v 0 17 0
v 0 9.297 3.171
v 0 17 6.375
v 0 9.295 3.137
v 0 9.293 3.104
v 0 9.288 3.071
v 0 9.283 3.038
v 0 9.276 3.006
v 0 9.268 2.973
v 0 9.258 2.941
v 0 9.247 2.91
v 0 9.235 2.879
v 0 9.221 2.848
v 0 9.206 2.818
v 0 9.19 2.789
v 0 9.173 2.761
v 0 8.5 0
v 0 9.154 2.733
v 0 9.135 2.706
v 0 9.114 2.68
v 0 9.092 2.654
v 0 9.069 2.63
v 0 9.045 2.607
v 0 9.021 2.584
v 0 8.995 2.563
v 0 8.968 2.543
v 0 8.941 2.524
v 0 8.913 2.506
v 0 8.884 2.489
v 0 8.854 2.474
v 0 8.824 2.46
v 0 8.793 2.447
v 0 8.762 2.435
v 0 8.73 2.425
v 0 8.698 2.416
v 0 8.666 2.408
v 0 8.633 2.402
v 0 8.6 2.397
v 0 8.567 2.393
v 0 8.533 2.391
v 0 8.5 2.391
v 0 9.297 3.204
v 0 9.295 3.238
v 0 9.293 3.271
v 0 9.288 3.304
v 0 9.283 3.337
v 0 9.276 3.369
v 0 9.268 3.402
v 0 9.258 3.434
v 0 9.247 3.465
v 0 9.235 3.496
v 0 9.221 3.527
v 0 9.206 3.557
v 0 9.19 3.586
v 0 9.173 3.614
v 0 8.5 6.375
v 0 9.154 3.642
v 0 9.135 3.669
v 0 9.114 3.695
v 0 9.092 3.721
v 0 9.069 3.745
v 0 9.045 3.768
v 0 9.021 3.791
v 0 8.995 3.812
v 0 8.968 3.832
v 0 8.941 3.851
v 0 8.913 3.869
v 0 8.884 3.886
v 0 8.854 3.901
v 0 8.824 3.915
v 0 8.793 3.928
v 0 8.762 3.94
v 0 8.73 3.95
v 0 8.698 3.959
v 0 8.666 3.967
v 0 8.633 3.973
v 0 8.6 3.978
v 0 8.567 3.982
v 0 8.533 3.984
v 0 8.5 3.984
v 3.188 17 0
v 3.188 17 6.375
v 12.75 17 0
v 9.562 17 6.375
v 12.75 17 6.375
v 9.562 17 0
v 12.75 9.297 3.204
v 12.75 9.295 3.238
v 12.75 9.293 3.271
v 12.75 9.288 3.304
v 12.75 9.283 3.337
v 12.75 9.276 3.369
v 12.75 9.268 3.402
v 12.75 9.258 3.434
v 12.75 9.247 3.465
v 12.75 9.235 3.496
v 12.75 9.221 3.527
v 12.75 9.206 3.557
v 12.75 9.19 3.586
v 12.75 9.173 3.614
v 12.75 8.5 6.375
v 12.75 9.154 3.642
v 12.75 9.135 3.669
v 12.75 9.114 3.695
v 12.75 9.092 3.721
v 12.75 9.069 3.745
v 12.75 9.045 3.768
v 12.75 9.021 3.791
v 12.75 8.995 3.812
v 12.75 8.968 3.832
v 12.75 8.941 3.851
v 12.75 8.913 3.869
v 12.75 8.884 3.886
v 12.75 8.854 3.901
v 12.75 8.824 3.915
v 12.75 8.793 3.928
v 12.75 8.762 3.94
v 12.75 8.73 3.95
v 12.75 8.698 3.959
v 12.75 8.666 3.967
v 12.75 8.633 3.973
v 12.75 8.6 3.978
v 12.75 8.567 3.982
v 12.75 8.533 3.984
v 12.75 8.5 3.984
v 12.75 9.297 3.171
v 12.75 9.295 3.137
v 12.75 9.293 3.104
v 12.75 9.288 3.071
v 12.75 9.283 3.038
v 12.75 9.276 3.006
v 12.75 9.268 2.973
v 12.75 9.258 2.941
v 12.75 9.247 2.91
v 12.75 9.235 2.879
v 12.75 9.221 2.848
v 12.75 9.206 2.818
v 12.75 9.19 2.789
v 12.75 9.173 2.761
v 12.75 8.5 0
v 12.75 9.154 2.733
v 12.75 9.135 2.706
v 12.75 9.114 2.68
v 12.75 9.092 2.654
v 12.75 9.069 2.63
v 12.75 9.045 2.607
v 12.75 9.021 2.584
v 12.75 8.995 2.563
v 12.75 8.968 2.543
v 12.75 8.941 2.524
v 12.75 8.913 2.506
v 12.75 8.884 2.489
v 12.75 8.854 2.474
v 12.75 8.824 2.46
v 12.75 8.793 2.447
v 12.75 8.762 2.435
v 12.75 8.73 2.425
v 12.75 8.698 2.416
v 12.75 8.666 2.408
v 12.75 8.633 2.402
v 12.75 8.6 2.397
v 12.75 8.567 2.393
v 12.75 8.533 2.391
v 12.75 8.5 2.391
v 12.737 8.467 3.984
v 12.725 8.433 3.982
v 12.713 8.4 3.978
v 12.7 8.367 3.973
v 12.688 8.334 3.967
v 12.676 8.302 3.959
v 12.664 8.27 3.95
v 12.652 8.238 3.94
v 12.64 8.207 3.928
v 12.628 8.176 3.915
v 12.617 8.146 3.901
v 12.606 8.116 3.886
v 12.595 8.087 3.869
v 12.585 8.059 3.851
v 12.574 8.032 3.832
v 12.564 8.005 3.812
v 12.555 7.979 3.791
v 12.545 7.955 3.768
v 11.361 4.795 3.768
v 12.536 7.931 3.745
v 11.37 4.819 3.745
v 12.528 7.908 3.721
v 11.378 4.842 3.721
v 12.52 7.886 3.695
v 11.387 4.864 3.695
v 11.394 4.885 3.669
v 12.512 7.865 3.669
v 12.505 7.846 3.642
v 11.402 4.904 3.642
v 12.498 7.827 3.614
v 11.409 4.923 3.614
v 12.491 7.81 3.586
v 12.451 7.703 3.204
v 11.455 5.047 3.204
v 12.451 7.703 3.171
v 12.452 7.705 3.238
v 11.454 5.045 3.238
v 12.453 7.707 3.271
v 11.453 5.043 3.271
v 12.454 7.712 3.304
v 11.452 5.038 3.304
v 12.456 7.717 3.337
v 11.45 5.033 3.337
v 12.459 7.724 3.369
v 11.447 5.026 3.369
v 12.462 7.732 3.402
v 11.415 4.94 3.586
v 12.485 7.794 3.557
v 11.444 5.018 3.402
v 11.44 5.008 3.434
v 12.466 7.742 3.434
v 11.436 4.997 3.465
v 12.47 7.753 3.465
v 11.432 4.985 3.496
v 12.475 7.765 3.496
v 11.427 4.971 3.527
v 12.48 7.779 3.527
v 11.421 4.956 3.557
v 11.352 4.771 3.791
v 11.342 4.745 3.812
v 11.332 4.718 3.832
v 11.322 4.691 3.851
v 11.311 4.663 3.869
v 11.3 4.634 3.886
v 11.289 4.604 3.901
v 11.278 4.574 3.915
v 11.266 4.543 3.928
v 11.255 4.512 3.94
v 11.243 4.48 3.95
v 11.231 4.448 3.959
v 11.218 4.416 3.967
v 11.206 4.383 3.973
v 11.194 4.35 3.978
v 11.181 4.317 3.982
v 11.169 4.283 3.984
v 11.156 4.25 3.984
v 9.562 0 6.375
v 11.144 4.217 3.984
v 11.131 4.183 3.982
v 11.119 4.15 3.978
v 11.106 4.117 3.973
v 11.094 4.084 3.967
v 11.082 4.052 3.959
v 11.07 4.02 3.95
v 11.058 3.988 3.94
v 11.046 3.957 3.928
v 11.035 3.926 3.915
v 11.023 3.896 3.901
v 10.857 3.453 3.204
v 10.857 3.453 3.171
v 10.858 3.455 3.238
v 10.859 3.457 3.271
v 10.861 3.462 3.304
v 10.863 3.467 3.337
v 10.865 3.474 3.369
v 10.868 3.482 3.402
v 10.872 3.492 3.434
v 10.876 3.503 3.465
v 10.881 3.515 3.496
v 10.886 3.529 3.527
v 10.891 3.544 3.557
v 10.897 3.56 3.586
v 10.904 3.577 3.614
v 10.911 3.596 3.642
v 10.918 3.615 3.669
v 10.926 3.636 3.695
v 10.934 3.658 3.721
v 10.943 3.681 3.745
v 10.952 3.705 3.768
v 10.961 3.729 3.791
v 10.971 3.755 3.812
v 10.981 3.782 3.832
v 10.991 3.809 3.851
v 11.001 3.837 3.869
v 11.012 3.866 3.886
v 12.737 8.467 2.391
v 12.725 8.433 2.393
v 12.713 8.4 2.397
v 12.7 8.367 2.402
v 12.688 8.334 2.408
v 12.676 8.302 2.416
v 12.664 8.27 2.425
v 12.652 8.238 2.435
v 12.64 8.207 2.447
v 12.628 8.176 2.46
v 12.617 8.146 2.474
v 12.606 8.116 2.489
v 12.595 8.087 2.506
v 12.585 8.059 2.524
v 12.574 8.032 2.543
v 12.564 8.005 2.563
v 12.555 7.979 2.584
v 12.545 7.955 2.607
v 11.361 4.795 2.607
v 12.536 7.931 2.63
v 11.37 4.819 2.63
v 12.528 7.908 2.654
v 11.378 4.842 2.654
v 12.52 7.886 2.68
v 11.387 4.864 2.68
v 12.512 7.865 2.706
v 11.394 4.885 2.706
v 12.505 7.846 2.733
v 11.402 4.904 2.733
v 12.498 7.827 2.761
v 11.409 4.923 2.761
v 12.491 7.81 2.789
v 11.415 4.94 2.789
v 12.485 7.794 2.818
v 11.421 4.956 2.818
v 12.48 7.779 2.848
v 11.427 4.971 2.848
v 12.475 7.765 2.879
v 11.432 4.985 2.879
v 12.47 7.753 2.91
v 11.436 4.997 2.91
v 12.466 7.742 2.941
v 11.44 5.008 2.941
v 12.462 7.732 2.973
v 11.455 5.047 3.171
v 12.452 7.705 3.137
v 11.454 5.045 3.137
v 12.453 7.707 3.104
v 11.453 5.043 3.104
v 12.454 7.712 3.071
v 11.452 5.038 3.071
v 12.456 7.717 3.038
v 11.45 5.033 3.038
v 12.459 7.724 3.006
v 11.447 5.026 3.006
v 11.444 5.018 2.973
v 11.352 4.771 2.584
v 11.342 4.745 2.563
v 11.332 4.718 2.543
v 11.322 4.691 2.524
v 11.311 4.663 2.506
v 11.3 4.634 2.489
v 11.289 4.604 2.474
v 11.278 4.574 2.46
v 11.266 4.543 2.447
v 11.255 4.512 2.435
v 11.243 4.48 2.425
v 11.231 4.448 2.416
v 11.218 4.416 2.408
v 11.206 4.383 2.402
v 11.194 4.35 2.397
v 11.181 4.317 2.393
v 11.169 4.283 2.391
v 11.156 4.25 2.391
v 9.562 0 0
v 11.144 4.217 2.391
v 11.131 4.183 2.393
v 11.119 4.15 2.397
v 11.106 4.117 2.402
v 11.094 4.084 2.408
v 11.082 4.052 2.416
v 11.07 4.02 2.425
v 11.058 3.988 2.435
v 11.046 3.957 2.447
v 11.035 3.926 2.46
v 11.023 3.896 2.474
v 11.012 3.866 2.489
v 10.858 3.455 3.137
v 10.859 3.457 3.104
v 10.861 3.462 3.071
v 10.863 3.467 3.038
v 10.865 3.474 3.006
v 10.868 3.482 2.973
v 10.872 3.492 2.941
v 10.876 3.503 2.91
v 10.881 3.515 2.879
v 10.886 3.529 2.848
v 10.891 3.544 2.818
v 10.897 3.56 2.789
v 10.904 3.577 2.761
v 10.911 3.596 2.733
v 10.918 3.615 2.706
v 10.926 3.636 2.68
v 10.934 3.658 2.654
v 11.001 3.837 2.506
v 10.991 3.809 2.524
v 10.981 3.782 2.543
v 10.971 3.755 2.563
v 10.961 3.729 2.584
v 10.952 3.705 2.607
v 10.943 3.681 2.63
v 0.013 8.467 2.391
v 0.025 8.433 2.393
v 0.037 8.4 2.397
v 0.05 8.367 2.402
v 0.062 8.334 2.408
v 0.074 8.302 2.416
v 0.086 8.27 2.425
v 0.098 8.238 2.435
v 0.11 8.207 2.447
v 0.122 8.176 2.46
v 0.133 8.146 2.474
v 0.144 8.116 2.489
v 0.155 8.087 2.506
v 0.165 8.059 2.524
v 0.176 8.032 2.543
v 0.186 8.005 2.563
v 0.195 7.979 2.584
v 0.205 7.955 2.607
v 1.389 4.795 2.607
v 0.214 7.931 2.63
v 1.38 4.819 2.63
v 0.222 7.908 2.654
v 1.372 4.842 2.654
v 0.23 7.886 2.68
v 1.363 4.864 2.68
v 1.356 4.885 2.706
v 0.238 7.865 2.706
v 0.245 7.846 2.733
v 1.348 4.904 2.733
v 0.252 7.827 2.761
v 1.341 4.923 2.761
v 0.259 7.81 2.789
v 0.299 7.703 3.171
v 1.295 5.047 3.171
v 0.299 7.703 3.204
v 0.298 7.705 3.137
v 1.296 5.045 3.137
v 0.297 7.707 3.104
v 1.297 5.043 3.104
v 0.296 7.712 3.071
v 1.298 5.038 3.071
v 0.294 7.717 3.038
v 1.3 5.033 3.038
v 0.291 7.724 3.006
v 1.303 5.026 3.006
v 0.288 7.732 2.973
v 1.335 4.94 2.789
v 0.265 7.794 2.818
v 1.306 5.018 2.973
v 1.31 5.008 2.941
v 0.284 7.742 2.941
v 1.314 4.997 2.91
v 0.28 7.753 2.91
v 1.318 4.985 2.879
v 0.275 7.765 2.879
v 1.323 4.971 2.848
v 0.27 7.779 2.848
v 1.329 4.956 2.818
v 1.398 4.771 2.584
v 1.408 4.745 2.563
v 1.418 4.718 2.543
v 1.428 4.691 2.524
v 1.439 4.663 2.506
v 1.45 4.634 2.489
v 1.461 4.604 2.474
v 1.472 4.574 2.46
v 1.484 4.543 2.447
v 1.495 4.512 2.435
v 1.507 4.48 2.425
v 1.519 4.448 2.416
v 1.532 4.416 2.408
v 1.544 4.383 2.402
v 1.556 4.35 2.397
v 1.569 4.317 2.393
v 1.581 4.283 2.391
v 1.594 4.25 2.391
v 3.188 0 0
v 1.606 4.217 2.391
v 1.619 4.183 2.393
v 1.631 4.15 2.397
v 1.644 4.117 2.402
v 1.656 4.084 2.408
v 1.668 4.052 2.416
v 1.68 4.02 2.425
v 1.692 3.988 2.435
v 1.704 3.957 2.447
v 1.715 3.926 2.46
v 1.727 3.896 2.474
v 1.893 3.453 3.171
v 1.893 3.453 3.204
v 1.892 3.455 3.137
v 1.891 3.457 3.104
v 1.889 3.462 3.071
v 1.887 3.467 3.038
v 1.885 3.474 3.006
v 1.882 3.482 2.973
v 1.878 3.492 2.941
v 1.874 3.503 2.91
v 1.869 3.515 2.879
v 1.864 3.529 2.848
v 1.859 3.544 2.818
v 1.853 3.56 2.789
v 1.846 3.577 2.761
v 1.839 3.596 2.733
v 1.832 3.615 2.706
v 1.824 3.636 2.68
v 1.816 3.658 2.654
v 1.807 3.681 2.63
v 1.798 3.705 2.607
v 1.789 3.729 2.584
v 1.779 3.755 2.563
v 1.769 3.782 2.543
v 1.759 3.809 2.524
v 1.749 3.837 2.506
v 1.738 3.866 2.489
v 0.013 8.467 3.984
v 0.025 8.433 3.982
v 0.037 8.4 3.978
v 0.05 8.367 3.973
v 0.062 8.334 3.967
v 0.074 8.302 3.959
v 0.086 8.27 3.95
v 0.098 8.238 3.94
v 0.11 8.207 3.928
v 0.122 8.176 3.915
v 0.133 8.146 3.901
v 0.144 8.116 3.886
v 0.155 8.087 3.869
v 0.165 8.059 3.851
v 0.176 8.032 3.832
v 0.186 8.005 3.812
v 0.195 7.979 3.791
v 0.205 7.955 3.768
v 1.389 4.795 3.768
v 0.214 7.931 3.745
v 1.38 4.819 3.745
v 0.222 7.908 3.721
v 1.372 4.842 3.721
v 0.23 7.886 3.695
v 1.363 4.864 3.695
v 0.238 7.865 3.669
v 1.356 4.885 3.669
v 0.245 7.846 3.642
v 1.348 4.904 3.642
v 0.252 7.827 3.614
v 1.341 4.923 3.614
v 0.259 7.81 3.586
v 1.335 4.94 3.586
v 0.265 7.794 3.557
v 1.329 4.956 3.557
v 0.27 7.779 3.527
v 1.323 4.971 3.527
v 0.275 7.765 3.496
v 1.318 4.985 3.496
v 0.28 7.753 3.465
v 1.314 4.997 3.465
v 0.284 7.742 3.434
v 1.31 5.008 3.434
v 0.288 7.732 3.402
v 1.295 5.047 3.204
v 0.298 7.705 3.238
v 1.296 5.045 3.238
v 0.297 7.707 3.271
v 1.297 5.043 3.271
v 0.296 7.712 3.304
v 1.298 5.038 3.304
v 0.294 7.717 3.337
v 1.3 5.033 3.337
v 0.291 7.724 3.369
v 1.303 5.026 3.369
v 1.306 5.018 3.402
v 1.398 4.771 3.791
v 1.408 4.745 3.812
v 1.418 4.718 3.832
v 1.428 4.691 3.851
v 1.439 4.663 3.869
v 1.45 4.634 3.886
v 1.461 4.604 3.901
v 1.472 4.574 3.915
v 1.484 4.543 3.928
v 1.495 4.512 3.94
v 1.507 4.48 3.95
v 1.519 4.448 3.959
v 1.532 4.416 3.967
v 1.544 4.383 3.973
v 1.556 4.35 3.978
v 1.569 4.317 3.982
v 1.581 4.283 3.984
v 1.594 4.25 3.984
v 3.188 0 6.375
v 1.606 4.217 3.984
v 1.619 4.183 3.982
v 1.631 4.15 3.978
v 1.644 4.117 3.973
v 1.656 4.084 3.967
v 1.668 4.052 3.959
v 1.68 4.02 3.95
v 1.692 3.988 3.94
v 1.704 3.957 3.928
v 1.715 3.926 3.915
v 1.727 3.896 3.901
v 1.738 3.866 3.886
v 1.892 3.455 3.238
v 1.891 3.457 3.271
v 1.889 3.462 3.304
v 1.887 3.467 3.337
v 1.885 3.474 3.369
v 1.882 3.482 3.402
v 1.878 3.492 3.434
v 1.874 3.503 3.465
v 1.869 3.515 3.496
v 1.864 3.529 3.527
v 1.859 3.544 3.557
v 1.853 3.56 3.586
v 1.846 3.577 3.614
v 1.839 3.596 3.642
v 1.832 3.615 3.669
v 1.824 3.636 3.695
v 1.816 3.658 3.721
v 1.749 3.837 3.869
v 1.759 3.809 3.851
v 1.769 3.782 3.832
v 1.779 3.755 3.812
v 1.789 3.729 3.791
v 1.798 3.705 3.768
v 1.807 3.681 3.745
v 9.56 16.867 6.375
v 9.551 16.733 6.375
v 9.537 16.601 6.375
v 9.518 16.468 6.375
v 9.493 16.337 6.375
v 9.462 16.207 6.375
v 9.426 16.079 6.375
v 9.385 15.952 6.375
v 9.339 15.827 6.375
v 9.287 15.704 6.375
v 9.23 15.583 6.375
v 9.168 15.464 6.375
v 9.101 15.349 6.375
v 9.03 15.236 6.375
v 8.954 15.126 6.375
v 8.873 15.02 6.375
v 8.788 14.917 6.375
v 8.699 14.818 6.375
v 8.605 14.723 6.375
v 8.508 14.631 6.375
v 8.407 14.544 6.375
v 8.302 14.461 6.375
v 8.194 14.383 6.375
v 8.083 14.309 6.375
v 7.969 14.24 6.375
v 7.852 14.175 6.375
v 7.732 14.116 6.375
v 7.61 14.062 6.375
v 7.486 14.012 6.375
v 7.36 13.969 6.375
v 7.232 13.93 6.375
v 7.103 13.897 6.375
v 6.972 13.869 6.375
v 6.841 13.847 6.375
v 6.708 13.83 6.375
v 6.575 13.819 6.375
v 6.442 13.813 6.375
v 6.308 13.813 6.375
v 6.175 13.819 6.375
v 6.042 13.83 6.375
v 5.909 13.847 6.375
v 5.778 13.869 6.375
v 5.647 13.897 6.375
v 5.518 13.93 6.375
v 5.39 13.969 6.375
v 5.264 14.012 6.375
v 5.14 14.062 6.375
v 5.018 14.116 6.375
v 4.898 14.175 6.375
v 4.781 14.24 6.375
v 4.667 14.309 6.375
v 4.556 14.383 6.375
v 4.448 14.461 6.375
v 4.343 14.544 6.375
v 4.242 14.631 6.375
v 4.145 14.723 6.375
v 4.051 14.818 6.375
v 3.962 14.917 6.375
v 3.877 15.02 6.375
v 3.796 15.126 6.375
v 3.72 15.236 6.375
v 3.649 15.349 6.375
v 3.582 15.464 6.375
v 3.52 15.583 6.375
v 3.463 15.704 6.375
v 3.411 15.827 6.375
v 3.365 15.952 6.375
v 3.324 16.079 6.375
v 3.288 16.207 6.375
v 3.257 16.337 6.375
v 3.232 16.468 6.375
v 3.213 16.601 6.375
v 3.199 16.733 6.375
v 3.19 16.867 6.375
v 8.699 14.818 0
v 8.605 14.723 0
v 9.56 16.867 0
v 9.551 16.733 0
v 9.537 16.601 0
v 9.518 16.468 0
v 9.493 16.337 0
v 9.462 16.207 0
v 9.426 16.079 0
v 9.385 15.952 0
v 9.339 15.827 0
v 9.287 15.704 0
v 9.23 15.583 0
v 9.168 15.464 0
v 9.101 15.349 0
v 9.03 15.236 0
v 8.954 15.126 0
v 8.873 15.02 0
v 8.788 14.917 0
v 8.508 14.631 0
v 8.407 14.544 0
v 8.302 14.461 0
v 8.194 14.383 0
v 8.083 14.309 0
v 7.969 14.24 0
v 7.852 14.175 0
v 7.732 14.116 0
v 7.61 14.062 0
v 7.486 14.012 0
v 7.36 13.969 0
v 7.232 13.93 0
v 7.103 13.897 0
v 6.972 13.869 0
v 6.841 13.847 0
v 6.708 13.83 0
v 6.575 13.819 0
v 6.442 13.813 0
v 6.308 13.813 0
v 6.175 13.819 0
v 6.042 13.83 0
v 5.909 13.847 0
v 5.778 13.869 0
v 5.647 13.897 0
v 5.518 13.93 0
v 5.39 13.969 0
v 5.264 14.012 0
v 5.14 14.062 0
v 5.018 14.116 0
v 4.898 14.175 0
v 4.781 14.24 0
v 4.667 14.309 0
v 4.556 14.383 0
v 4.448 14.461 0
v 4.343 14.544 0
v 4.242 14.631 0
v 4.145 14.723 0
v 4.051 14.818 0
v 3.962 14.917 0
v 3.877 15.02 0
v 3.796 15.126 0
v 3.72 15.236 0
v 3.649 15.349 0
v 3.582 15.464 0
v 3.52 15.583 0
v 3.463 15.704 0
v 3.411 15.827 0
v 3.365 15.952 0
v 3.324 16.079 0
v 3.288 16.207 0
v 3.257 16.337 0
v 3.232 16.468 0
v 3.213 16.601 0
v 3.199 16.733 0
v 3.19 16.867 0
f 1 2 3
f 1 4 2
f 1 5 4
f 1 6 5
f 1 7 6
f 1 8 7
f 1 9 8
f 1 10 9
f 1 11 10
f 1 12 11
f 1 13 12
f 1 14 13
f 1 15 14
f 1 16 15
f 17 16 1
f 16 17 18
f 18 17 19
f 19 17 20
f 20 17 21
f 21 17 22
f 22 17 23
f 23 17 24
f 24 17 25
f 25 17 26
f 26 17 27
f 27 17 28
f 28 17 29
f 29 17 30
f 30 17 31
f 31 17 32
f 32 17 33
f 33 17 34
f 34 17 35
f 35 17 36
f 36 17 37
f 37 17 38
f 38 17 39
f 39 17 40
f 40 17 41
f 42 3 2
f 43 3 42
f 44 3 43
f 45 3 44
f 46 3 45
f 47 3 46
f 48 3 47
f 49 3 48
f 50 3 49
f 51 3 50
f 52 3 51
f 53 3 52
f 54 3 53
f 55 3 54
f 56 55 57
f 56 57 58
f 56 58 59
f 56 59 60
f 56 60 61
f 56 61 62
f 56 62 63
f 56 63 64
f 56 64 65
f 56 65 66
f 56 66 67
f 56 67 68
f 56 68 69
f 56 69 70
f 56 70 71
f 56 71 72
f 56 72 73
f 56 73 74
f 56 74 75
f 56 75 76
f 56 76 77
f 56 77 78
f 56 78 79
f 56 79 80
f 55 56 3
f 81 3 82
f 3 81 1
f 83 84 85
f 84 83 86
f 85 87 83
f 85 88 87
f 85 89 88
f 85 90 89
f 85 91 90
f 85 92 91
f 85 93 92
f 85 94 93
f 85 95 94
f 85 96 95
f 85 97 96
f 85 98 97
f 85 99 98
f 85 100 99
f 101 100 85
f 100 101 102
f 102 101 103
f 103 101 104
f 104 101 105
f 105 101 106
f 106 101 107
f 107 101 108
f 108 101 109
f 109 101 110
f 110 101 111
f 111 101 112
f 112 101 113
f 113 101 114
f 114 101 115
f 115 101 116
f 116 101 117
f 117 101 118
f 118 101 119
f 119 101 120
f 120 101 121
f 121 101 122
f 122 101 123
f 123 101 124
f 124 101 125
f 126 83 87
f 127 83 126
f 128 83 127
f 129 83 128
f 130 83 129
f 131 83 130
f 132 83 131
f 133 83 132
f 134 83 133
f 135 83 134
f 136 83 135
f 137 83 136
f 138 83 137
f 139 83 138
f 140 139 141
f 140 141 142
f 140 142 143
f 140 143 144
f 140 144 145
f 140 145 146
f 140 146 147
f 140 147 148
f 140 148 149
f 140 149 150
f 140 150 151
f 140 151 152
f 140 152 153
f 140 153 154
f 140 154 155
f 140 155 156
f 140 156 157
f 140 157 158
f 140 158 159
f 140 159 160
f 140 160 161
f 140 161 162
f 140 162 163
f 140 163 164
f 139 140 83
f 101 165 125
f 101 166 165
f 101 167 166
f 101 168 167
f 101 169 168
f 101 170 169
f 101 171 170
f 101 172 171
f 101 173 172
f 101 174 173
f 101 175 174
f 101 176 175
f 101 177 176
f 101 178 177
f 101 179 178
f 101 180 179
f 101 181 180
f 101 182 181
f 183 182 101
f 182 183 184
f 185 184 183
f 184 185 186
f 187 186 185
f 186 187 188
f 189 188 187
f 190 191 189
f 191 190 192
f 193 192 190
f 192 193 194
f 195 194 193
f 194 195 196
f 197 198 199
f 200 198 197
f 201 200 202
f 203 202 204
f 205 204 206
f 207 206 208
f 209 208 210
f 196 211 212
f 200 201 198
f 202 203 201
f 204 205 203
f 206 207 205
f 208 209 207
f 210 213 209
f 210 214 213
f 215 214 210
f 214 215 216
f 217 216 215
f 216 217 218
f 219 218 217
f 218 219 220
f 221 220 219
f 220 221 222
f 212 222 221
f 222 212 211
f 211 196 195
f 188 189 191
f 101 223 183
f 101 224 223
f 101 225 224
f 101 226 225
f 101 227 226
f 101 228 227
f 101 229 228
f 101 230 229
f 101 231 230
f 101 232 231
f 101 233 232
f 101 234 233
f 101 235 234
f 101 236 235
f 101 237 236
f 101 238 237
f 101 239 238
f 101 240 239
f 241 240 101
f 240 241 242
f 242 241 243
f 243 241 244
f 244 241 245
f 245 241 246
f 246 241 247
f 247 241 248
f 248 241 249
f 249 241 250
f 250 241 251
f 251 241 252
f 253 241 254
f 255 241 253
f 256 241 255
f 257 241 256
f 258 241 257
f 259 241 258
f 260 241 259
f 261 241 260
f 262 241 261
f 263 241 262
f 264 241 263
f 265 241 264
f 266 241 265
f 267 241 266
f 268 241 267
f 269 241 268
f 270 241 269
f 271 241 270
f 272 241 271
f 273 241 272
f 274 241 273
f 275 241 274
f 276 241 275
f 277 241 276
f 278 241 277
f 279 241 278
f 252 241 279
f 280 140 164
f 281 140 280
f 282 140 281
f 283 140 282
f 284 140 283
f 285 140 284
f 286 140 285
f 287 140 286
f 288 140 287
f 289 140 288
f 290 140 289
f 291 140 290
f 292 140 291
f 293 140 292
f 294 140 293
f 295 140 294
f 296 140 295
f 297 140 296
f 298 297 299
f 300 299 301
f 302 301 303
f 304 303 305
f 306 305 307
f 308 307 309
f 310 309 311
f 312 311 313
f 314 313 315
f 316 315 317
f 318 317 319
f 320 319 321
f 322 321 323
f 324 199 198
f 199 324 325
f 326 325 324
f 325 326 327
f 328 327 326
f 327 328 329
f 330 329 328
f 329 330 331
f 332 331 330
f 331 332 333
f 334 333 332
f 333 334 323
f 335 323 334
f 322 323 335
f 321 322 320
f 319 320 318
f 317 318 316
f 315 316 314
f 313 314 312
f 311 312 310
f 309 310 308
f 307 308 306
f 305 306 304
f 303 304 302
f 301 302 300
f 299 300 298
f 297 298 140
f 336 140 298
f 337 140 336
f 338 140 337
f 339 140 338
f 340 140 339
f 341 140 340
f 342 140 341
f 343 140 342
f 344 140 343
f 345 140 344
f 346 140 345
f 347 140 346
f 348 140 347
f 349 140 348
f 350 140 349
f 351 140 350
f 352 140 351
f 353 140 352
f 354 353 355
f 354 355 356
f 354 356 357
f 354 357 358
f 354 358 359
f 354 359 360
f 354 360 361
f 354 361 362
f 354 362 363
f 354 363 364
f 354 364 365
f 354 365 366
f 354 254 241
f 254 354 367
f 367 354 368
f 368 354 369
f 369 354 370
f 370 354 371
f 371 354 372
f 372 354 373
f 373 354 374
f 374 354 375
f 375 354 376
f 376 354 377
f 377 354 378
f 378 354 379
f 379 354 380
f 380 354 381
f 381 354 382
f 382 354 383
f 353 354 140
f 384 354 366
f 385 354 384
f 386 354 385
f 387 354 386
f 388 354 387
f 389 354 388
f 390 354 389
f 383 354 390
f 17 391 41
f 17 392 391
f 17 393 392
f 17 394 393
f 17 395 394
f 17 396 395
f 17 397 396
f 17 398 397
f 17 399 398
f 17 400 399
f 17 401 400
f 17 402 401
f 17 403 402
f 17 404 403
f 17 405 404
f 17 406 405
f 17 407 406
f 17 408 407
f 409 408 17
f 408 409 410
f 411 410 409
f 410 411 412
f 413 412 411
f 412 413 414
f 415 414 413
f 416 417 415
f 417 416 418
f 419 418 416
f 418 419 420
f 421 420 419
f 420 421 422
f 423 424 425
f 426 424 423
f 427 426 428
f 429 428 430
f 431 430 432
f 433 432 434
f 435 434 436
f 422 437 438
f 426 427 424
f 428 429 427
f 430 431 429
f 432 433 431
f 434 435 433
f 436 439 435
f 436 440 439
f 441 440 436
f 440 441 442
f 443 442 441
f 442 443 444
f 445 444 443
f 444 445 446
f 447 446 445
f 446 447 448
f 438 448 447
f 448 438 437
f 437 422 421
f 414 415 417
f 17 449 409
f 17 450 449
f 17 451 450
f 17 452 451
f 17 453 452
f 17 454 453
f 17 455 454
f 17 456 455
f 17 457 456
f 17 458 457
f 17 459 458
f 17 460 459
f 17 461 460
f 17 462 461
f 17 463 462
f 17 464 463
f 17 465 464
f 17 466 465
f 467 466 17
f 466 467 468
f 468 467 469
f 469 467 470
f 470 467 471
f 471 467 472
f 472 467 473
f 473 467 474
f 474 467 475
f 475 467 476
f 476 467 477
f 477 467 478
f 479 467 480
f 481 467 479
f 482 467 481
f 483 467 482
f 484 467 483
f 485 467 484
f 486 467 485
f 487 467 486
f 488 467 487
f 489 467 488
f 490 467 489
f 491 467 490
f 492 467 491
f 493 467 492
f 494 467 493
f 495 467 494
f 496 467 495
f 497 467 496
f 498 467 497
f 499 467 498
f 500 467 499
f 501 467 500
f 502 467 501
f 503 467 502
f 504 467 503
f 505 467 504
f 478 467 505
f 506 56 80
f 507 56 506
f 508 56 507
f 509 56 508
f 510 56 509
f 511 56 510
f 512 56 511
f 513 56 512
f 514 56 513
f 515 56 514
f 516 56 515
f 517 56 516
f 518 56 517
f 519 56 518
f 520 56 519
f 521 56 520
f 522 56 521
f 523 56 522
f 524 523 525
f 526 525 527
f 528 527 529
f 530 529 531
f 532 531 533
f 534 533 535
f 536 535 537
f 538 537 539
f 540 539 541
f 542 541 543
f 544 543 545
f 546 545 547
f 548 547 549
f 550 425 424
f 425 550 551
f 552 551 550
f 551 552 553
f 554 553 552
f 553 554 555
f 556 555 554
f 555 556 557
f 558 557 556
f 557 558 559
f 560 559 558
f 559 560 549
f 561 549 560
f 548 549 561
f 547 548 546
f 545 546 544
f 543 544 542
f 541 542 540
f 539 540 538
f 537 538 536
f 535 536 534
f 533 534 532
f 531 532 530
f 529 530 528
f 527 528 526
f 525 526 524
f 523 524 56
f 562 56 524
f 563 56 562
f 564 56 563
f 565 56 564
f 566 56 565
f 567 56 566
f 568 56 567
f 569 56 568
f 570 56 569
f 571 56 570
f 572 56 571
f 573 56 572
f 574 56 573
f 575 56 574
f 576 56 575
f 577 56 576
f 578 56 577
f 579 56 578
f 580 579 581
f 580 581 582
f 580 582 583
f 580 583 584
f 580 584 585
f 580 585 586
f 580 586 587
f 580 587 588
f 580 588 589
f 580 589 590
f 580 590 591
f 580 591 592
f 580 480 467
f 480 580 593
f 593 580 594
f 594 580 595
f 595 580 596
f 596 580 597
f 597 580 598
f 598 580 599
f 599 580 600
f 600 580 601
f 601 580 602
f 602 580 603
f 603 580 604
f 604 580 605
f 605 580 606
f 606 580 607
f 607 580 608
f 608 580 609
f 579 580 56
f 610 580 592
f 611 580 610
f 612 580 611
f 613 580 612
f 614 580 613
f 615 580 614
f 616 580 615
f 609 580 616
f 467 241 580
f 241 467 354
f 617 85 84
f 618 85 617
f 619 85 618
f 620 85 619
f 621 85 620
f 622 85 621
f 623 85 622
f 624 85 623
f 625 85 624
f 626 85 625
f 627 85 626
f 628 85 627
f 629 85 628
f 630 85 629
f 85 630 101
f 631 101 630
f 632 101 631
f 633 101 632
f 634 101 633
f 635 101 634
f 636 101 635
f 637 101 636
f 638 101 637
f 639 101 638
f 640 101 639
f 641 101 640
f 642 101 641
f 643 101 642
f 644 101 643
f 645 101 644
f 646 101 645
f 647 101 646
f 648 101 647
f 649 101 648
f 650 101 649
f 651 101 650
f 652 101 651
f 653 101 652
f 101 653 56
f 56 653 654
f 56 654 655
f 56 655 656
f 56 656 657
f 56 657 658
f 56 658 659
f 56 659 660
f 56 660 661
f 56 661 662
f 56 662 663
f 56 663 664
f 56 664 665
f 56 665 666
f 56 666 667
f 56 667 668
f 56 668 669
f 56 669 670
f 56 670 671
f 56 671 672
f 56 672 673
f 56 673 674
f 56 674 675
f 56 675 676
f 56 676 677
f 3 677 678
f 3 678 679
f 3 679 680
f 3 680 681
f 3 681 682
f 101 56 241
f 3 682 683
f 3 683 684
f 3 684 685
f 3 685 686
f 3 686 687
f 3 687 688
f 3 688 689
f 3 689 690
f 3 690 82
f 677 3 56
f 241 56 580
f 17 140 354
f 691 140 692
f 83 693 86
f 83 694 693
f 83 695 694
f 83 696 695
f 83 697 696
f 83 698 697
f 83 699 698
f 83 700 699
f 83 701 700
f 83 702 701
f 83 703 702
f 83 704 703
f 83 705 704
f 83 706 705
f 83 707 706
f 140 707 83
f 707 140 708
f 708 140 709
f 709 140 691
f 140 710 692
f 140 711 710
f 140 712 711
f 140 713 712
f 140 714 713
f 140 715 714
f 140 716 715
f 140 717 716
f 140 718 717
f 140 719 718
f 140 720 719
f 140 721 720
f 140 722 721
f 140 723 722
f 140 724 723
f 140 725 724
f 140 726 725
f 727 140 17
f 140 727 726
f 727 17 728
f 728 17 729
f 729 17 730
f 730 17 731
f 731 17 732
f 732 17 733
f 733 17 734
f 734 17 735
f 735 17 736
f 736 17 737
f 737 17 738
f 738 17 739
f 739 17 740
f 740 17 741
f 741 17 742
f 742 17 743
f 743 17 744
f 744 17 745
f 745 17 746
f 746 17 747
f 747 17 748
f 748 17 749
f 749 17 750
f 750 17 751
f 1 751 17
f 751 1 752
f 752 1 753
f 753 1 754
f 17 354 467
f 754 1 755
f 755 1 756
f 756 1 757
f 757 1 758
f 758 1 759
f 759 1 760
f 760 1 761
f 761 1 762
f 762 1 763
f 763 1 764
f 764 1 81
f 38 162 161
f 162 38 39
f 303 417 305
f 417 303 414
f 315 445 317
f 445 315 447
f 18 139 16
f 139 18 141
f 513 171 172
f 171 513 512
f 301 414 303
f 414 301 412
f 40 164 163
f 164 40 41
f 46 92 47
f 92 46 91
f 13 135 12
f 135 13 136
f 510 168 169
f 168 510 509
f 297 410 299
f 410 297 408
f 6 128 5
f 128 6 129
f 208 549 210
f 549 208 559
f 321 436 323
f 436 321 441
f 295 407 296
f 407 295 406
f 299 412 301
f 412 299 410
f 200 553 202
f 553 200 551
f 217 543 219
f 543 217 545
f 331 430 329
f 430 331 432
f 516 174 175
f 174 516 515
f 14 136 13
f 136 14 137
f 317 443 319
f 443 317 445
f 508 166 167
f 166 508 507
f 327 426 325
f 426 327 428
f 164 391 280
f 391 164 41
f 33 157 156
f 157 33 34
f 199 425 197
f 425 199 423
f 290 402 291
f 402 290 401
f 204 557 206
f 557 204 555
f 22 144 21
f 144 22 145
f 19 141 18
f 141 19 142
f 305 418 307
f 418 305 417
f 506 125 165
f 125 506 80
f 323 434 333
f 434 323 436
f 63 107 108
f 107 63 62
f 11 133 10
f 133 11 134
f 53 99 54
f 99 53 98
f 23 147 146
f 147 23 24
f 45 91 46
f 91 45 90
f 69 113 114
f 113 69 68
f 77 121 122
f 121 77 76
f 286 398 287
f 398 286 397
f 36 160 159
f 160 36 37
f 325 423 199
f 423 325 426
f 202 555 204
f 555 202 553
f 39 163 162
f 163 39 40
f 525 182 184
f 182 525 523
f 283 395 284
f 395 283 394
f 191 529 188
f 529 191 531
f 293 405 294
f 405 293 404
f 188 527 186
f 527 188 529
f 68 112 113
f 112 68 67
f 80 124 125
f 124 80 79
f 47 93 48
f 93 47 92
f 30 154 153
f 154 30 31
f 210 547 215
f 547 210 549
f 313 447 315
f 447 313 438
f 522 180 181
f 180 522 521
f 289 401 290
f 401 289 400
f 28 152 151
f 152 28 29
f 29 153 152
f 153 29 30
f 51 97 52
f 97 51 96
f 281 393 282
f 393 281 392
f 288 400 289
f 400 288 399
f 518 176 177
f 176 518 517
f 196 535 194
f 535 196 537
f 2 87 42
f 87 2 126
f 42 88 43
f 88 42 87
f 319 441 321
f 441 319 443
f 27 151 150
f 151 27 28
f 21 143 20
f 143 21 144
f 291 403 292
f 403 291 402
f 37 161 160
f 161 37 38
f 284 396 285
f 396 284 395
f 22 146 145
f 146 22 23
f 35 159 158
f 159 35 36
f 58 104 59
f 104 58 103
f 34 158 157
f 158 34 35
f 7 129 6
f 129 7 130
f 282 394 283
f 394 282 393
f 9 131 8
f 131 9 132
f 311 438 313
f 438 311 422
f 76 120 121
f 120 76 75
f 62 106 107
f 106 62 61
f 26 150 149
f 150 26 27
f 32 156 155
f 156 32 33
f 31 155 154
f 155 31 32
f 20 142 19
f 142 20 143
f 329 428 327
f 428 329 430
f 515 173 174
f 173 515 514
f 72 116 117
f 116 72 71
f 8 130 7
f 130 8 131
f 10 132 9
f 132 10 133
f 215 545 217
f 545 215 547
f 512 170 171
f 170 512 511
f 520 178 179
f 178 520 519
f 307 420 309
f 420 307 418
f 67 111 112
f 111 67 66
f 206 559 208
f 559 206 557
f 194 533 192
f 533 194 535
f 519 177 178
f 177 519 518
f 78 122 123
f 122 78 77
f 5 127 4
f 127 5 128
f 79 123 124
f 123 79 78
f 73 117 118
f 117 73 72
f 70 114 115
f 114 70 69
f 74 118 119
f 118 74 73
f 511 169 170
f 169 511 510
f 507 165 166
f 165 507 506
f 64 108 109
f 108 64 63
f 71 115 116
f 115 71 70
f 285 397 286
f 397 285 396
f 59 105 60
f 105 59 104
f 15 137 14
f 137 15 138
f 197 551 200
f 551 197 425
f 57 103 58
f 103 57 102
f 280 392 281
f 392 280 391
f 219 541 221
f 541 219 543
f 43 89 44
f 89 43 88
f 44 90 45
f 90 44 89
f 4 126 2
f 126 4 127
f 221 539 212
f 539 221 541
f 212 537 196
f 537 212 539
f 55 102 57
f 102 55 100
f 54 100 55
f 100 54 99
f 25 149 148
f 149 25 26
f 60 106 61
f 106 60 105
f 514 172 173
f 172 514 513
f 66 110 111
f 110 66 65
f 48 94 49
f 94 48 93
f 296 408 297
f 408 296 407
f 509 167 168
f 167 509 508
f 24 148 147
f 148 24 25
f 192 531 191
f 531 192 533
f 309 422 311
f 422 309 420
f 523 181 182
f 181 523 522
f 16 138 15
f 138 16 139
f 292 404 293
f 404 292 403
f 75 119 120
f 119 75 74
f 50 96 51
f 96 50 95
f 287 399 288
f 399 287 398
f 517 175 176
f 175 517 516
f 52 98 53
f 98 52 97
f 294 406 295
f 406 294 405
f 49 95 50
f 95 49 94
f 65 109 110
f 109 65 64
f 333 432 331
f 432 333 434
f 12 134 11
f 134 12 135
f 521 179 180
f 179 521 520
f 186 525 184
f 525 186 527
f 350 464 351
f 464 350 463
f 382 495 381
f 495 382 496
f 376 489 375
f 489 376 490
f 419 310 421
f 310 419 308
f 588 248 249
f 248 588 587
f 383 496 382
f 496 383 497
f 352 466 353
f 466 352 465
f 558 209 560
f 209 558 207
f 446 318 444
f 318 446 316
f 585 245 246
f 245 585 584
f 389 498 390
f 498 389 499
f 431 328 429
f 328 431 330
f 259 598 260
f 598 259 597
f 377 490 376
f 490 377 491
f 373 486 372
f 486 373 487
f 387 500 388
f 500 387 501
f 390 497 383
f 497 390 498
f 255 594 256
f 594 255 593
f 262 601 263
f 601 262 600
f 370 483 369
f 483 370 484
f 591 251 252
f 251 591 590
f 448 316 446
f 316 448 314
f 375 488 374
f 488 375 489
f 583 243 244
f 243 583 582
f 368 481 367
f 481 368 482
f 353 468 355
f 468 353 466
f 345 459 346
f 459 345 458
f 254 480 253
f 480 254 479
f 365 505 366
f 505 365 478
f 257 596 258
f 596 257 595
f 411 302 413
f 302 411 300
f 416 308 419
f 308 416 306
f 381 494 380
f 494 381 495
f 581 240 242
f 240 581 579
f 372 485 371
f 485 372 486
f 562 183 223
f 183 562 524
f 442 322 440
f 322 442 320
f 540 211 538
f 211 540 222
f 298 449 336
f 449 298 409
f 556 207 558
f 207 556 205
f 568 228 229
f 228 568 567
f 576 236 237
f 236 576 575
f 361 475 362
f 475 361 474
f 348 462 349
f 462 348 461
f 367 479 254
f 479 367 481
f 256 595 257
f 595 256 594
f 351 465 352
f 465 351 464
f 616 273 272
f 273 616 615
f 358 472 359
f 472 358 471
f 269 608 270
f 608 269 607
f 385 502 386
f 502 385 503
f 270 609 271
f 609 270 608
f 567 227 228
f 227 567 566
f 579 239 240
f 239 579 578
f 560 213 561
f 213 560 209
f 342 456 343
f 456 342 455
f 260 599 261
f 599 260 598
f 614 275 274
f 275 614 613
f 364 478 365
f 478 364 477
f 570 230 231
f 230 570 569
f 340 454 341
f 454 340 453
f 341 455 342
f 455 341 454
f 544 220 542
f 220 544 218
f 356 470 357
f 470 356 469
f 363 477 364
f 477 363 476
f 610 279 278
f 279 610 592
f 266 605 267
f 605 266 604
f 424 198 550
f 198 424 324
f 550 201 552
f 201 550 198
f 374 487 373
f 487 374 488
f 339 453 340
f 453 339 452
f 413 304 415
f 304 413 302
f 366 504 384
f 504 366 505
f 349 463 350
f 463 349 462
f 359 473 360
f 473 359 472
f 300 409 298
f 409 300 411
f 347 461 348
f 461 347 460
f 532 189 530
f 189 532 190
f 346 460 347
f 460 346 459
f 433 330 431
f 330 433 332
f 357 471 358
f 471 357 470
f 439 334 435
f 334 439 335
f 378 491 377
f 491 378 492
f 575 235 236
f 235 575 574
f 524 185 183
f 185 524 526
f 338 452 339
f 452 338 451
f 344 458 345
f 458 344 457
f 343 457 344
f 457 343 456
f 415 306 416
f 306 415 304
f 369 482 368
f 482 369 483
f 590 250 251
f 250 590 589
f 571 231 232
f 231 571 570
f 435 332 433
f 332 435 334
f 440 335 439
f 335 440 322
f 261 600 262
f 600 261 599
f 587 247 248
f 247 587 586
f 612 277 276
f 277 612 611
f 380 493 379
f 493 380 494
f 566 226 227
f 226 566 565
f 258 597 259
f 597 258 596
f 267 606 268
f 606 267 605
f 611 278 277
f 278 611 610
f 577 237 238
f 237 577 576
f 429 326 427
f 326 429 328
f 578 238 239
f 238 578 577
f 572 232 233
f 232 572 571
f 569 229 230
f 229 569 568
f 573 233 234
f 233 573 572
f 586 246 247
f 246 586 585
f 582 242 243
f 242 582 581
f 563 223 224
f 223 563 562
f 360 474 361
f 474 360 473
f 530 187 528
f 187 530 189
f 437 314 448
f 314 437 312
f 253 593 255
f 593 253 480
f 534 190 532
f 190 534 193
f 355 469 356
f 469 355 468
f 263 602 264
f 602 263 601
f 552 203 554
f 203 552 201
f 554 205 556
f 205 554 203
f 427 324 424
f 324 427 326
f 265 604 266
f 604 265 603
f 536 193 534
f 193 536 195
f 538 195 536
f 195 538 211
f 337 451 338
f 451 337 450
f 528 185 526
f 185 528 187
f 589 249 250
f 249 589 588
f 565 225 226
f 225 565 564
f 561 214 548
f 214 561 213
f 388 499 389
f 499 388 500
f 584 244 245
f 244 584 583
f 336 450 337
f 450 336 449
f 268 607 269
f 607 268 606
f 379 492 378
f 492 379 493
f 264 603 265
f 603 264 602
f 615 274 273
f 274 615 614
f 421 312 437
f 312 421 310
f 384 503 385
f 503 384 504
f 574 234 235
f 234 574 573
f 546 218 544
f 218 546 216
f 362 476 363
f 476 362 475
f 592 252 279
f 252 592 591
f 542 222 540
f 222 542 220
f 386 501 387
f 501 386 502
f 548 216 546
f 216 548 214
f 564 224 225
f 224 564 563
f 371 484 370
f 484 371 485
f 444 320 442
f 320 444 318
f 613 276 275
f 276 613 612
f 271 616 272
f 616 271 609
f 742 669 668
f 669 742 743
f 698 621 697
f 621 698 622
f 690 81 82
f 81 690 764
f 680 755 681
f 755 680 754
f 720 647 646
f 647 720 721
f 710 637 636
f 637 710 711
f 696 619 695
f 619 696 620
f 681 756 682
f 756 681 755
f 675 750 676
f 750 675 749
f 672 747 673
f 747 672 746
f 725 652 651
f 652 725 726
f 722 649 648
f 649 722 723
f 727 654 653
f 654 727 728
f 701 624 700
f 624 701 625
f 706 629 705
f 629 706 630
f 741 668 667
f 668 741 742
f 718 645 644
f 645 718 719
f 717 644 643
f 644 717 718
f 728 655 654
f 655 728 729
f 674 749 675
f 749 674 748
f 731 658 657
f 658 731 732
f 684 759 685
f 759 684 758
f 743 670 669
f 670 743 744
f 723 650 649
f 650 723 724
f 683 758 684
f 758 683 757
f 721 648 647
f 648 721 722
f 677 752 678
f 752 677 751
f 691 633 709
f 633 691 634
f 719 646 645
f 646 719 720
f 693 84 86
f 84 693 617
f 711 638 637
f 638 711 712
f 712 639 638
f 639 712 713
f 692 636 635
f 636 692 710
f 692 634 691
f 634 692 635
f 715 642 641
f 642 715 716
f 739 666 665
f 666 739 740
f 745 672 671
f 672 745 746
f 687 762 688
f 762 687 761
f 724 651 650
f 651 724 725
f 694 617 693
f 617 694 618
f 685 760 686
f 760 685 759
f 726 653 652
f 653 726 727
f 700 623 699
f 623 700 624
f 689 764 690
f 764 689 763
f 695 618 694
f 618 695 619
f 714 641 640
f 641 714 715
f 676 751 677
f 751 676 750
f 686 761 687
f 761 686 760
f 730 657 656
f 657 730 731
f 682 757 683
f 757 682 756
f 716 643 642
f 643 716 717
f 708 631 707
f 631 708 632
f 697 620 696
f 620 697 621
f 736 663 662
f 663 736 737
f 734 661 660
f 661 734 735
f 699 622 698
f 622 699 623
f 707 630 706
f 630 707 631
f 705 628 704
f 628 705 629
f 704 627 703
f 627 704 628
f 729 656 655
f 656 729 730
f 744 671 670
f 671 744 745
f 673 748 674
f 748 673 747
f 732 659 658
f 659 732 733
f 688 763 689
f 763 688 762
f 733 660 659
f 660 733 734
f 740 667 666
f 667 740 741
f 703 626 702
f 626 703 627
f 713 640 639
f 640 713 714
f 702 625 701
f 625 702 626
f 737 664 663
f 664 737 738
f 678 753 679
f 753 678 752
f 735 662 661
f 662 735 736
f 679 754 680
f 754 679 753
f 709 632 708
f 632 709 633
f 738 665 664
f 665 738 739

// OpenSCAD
$fn = 150;

difference() {
	linear_extrude(height = 6.375) {
		polygon(points = [[3.1875, 0], [0, 8.5], [0, 17.0], [12.75, 17.0], [12.75, 8.5], [9.5625, 0]]);
	}
	translate(v = [-1, 8.5, 3.1875]) {
		rotate(a = [0, 90, 0]) {
			cylinder(d = 1.59375, h = 14.75);
		}
	}
	translate(v = [-1, 4.25, 3.1875]) {
		rotate(a = [0, 90, 0]) {
			cylinder(d = 1.59375, h = 14.75);
		}
	}
	translate(v = [6.375, 17.0, -1]) {
		cylinder(h = 8.375, r = 3.1875);
	}
}
